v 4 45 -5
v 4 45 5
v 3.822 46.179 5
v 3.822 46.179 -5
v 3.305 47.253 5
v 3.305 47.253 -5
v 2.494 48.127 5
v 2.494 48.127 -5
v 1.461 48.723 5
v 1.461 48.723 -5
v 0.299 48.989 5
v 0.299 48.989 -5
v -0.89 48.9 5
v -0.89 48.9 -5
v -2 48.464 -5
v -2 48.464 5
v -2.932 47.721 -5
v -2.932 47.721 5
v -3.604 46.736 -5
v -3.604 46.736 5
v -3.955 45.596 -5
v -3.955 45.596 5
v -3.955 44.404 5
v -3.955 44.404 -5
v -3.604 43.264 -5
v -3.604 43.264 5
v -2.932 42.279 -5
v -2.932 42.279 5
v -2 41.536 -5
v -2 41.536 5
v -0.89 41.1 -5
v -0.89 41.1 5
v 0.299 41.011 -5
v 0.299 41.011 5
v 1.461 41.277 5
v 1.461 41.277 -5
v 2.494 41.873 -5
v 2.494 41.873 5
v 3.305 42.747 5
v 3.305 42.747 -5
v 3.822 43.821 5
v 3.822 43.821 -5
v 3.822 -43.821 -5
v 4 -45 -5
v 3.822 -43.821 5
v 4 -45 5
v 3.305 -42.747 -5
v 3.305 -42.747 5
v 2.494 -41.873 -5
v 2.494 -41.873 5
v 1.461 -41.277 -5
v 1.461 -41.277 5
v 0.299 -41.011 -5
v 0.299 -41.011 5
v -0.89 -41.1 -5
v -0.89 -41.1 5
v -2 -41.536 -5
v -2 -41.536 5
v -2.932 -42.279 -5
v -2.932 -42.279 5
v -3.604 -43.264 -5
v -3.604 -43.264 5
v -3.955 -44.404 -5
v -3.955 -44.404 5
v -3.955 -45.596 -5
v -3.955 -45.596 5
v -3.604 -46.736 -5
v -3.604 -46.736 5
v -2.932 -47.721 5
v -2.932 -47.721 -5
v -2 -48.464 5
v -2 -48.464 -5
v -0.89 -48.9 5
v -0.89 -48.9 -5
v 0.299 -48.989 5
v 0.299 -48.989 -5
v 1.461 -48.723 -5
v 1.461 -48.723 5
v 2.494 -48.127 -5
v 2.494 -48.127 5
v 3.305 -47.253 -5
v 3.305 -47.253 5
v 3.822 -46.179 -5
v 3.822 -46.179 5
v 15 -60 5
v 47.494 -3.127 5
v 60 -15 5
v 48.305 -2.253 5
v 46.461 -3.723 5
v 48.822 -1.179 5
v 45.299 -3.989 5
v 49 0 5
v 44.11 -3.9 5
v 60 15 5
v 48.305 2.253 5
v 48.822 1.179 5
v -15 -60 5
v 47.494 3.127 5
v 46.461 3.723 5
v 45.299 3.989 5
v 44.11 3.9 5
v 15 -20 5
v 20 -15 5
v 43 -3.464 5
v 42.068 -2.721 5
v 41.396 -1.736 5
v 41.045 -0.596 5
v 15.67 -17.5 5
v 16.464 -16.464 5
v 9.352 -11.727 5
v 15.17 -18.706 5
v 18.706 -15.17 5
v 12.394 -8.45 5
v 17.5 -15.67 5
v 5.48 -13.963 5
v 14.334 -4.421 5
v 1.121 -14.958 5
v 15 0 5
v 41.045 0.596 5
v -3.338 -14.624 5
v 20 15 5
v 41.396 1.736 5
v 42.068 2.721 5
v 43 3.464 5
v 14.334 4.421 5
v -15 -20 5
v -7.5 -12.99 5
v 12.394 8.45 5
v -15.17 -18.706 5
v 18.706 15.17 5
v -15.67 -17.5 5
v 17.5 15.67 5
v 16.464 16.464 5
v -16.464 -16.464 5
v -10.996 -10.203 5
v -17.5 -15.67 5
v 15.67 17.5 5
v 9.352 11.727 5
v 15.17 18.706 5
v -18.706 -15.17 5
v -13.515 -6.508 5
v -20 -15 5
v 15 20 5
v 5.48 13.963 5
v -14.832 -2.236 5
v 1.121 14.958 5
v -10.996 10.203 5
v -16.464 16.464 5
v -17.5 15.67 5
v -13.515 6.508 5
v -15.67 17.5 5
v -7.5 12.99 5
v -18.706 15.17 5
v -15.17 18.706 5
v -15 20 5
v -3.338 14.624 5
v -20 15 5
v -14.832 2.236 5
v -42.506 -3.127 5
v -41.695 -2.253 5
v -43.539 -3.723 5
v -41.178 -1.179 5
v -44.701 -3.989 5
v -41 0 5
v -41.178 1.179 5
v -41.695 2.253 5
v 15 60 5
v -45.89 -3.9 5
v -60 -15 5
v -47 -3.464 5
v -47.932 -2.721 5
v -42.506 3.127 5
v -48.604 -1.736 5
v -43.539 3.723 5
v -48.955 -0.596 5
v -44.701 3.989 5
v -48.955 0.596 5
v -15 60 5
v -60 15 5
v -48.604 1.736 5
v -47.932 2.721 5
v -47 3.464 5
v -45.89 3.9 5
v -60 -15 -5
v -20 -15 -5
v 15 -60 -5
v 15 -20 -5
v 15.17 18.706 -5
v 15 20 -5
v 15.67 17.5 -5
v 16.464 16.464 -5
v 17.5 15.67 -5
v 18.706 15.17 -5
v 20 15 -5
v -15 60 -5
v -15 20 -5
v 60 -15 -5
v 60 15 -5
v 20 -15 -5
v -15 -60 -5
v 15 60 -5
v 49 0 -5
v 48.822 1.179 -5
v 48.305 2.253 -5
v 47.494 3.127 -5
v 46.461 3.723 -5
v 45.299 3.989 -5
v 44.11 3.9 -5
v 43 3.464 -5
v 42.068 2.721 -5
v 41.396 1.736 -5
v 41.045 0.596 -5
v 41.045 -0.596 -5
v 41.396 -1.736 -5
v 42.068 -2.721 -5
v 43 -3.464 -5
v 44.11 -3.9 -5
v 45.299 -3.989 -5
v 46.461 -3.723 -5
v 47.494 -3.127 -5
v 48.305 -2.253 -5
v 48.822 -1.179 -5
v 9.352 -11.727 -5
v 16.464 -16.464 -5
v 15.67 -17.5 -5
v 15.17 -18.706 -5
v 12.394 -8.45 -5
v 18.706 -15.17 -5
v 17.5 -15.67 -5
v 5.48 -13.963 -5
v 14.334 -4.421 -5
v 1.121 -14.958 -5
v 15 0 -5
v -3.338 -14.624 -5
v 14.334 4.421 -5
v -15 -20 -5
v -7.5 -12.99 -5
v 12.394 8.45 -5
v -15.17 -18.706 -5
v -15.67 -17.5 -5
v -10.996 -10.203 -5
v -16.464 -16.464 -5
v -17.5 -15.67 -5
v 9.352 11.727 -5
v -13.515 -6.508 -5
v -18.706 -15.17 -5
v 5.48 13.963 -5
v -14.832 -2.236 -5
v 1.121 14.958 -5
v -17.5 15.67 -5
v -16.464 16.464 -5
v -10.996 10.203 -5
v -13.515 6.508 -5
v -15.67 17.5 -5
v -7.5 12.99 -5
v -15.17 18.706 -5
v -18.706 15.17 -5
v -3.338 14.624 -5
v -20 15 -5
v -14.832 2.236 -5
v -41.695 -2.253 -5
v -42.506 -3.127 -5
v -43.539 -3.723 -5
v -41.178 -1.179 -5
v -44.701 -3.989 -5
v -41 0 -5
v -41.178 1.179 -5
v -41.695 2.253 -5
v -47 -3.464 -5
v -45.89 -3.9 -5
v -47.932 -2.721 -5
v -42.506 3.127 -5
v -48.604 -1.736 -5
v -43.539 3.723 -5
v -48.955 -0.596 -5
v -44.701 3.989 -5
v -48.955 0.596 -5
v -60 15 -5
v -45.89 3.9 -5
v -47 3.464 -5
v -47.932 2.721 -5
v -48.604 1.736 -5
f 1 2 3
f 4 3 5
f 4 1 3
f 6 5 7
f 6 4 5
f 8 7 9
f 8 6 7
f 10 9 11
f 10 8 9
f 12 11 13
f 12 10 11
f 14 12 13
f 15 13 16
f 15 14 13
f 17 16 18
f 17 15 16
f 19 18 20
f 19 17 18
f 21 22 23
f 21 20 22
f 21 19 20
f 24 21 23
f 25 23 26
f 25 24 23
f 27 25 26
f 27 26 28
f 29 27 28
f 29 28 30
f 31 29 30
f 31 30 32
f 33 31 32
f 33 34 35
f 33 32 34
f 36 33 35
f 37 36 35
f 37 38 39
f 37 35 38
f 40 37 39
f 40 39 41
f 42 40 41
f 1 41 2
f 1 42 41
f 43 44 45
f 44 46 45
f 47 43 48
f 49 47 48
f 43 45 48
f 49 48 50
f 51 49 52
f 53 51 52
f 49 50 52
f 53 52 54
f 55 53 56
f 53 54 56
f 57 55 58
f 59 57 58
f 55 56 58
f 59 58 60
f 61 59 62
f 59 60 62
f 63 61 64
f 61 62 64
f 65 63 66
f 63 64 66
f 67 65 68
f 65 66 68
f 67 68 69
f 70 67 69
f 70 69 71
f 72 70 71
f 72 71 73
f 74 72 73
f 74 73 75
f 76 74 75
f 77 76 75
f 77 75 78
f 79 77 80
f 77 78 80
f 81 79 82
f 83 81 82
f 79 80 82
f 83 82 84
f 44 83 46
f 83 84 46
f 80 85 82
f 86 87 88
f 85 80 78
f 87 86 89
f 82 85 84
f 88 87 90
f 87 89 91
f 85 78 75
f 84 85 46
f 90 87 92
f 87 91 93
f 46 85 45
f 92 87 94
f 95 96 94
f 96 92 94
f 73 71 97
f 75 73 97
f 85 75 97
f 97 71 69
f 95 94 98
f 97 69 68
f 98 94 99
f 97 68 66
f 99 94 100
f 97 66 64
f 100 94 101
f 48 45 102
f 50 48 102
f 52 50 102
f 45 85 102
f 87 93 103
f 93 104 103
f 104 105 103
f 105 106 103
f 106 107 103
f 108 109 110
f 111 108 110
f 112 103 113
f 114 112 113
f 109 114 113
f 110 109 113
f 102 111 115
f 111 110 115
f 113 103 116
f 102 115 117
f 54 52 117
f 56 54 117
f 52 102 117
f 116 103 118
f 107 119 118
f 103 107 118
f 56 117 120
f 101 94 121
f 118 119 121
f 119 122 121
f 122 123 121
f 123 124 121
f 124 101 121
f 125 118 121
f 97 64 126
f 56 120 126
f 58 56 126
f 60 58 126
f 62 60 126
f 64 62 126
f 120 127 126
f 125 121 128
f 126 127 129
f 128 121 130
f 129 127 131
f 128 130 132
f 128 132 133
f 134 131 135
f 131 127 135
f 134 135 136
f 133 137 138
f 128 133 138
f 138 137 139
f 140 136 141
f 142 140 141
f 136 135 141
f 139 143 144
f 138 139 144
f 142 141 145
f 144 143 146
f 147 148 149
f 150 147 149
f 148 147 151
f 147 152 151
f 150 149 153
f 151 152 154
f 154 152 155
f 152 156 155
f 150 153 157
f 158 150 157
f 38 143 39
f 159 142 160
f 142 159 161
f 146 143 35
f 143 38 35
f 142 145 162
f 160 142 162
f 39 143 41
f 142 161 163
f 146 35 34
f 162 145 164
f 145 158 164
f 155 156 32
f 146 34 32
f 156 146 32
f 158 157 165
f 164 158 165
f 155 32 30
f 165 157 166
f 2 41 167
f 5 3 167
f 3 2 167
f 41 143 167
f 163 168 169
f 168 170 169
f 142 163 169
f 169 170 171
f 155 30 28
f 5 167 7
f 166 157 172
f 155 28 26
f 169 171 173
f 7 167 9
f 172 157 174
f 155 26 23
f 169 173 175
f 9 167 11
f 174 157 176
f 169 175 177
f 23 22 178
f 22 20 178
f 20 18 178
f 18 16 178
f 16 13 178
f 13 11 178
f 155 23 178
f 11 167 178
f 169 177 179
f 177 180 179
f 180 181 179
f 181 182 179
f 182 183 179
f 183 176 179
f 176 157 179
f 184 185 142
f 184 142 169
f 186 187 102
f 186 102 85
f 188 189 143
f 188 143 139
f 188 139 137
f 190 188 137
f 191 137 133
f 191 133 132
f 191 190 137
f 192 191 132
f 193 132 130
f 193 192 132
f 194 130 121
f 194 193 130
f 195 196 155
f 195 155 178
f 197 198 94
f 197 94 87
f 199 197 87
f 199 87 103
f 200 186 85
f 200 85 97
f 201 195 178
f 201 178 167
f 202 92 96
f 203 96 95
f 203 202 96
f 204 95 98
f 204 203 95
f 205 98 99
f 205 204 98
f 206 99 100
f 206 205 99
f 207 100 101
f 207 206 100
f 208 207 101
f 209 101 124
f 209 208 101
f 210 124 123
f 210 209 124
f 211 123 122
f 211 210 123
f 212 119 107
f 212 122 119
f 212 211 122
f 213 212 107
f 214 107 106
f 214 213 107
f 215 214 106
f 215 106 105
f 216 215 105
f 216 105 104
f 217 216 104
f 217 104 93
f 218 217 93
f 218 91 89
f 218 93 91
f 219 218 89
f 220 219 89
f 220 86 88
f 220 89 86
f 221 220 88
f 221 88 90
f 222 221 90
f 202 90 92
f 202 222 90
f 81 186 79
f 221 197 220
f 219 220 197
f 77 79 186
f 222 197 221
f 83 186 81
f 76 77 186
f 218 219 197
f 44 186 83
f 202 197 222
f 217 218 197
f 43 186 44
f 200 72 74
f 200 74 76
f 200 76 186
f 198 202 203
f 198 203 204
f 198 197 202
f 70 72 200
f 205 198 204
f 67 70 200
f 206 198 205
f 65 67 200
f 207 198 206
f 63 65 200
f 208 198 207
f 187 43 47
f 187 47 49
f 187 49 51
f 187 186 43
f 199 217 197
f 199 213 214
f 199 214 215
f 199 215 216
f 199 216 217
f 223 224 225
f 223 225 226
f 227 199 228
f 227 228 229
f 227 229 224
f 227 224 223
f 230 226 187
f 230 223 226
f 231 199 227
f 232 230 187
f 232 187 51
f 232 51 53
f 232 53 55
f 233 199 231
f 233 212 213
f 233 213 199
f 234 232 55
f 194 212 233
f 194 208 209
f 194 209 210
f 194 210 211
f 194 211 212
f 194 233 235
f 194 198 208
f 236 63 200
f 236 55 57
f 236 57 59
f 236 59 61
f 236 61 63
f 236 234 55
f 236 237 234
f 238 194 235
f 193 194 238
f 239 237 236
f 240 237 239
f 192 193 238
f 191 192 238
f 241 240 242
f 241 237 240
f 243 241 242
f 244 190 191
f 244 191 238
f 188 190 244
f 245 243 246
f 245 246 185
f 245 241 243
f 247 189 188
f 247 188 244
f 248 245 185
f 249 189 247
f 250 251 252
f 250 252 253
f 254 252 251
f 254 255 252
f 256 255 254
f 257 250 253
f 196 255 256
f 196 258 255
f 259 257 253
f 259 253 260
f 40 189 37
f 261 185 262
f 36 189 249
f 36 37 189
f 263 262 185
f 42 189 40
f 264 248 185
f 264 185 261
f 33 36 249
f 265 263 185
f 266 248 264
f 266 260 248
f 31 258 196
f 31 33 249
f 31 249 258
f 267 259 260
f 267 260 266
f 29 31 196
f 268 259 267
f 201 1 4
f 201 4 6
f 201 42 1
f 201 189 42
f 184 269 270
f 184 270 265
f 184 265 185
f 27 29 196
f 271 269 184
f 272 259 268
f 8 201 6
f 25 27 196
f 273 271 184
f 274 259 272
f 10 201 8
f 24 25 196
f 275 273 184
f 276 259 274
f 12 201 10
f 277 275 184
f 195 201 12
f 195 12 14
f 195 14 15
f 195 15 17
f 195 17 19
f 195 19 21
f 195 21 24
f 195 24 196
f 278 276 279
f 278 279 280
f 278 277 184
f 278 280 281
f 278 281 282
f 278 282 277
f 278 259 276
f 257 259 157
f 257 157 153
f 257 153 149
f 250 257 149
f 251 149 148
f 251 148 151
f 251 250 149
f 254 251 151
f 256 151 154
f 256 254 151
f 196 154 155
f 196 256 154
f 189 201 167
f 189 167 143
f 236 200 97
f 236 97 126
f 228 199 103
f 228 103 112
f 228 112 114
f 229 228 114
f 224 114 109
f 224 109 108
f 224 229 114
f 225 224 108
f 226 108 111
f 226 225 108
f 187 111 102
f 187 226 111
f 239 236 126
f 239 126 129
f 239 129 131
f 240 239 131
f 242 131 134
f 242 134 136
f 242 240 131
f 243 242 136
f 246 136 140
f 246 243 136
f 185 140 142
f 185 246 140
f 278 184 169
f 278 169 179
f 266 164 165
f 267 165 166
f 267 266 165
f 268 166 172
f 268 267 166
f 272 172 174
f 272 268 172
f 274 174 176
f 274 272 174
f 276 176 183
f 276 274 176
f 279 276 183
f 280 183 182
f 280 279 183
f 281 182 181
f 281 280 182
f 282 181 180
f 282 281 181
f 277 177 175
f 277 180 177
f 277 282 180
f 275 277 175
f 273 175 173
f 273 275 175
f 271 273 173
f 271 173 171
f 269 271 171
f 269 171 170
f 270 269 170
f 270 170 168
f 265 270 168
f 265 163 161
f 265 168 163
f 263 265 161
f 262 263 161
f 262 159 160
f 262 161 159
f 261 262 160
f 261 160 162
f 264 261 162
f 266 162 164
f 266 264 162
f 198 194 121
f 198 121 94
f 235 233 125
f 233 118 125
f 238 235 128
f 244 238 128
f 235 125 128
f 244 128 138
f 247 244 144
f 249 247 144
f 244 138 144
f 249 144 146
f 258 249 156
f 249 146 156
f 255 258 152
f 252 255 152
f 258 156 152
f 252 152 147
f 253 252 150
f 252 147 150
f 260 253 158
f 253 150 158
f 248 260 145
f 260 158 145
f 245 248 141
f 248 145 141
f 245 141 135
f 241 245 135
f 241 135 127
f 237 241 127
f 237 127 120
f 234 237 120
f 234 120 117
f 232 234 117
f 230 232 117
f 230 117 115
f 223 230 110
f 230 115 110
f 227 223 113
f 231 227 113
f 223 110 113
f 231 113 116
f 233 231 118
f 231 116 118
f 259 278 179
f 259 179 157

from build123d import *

# Parameters (mm, degrees)
EXTRUDE_6_DEPTH     = 10
SKETCH_7_R          = 15
CUT_EXTRUDE_1_DEPTH = 121
SKETCH_8_R          = 4
CUT_EXTRUDE_2_DEPTH = 121


with BuildPart() as part:
    # 草图6 → 凸台-拉伸6 (new body)
    with BuildSketch(Plane.XY.offset(-5)):
        with BuildLine():
            Line((-15, 60), (15, 60))
            Line((15, 60), (15, 20))
            ThreePointArc((15, 20), (16.464466094, 16.464466094), (20, 15))
            Line((20, 15), (60, 15))
            Line((60, 15), (60, -15))
            Line((60, -15), (20, -15))
            ThreePointArc((20, -15), (16.464466094, -16.464466094), (15, -20))
            Line((15, -20), (15, -60))
            Line((15, -60), (-15, -60))
            Line((-15, -60), (-15, -20))
            ThreePointArc((-15, -20), (-16.464466094, -16.464466094), (-20, -15))
            Line((-20, -15), (-60, -15))
            Line((-60, -15), (-60, 15))
            Line((-60, 15), (-20, 15))
            ThreePointArc((-20, 15), (-16.464466094, 16.464466094), (-15, 20))
            Line((-15, 20), (-15, 60))
        make_face()
    extrude(amount=EXTRUDE_6_DEPTH)

    # 草图7 → 切除-拉伸1 (cut, symmetric)
    with BuildSketch(Plane.XY.offset(-5)):
        Circle(SKETCH_7_R)
    extrude(amount=CUT_EXTRUDE_1_DEPTH, both=True, mode=Mode.SUBTRACT)

    # 草图8 → 切除-拉伸2 (cut, symmetric)
    with BuildSketch(Plane.XY.offset(-5)):
        with Locations((45, 0)):
            Circle(SKETCH_8_R)
        with Locations((-45, 0)):
            Circle(SKETCH_8_R)
        with Locations((0, 45)):
            Circle(SKETCH_8_R)
        with Locations((0, -45)):
            Circle(SKETCH_8_R)
    extrude(amount=CUT_EXTRUDE_2_DEPTH, both=True, mode=Mode.SUBTRACT)


solid = part.part
